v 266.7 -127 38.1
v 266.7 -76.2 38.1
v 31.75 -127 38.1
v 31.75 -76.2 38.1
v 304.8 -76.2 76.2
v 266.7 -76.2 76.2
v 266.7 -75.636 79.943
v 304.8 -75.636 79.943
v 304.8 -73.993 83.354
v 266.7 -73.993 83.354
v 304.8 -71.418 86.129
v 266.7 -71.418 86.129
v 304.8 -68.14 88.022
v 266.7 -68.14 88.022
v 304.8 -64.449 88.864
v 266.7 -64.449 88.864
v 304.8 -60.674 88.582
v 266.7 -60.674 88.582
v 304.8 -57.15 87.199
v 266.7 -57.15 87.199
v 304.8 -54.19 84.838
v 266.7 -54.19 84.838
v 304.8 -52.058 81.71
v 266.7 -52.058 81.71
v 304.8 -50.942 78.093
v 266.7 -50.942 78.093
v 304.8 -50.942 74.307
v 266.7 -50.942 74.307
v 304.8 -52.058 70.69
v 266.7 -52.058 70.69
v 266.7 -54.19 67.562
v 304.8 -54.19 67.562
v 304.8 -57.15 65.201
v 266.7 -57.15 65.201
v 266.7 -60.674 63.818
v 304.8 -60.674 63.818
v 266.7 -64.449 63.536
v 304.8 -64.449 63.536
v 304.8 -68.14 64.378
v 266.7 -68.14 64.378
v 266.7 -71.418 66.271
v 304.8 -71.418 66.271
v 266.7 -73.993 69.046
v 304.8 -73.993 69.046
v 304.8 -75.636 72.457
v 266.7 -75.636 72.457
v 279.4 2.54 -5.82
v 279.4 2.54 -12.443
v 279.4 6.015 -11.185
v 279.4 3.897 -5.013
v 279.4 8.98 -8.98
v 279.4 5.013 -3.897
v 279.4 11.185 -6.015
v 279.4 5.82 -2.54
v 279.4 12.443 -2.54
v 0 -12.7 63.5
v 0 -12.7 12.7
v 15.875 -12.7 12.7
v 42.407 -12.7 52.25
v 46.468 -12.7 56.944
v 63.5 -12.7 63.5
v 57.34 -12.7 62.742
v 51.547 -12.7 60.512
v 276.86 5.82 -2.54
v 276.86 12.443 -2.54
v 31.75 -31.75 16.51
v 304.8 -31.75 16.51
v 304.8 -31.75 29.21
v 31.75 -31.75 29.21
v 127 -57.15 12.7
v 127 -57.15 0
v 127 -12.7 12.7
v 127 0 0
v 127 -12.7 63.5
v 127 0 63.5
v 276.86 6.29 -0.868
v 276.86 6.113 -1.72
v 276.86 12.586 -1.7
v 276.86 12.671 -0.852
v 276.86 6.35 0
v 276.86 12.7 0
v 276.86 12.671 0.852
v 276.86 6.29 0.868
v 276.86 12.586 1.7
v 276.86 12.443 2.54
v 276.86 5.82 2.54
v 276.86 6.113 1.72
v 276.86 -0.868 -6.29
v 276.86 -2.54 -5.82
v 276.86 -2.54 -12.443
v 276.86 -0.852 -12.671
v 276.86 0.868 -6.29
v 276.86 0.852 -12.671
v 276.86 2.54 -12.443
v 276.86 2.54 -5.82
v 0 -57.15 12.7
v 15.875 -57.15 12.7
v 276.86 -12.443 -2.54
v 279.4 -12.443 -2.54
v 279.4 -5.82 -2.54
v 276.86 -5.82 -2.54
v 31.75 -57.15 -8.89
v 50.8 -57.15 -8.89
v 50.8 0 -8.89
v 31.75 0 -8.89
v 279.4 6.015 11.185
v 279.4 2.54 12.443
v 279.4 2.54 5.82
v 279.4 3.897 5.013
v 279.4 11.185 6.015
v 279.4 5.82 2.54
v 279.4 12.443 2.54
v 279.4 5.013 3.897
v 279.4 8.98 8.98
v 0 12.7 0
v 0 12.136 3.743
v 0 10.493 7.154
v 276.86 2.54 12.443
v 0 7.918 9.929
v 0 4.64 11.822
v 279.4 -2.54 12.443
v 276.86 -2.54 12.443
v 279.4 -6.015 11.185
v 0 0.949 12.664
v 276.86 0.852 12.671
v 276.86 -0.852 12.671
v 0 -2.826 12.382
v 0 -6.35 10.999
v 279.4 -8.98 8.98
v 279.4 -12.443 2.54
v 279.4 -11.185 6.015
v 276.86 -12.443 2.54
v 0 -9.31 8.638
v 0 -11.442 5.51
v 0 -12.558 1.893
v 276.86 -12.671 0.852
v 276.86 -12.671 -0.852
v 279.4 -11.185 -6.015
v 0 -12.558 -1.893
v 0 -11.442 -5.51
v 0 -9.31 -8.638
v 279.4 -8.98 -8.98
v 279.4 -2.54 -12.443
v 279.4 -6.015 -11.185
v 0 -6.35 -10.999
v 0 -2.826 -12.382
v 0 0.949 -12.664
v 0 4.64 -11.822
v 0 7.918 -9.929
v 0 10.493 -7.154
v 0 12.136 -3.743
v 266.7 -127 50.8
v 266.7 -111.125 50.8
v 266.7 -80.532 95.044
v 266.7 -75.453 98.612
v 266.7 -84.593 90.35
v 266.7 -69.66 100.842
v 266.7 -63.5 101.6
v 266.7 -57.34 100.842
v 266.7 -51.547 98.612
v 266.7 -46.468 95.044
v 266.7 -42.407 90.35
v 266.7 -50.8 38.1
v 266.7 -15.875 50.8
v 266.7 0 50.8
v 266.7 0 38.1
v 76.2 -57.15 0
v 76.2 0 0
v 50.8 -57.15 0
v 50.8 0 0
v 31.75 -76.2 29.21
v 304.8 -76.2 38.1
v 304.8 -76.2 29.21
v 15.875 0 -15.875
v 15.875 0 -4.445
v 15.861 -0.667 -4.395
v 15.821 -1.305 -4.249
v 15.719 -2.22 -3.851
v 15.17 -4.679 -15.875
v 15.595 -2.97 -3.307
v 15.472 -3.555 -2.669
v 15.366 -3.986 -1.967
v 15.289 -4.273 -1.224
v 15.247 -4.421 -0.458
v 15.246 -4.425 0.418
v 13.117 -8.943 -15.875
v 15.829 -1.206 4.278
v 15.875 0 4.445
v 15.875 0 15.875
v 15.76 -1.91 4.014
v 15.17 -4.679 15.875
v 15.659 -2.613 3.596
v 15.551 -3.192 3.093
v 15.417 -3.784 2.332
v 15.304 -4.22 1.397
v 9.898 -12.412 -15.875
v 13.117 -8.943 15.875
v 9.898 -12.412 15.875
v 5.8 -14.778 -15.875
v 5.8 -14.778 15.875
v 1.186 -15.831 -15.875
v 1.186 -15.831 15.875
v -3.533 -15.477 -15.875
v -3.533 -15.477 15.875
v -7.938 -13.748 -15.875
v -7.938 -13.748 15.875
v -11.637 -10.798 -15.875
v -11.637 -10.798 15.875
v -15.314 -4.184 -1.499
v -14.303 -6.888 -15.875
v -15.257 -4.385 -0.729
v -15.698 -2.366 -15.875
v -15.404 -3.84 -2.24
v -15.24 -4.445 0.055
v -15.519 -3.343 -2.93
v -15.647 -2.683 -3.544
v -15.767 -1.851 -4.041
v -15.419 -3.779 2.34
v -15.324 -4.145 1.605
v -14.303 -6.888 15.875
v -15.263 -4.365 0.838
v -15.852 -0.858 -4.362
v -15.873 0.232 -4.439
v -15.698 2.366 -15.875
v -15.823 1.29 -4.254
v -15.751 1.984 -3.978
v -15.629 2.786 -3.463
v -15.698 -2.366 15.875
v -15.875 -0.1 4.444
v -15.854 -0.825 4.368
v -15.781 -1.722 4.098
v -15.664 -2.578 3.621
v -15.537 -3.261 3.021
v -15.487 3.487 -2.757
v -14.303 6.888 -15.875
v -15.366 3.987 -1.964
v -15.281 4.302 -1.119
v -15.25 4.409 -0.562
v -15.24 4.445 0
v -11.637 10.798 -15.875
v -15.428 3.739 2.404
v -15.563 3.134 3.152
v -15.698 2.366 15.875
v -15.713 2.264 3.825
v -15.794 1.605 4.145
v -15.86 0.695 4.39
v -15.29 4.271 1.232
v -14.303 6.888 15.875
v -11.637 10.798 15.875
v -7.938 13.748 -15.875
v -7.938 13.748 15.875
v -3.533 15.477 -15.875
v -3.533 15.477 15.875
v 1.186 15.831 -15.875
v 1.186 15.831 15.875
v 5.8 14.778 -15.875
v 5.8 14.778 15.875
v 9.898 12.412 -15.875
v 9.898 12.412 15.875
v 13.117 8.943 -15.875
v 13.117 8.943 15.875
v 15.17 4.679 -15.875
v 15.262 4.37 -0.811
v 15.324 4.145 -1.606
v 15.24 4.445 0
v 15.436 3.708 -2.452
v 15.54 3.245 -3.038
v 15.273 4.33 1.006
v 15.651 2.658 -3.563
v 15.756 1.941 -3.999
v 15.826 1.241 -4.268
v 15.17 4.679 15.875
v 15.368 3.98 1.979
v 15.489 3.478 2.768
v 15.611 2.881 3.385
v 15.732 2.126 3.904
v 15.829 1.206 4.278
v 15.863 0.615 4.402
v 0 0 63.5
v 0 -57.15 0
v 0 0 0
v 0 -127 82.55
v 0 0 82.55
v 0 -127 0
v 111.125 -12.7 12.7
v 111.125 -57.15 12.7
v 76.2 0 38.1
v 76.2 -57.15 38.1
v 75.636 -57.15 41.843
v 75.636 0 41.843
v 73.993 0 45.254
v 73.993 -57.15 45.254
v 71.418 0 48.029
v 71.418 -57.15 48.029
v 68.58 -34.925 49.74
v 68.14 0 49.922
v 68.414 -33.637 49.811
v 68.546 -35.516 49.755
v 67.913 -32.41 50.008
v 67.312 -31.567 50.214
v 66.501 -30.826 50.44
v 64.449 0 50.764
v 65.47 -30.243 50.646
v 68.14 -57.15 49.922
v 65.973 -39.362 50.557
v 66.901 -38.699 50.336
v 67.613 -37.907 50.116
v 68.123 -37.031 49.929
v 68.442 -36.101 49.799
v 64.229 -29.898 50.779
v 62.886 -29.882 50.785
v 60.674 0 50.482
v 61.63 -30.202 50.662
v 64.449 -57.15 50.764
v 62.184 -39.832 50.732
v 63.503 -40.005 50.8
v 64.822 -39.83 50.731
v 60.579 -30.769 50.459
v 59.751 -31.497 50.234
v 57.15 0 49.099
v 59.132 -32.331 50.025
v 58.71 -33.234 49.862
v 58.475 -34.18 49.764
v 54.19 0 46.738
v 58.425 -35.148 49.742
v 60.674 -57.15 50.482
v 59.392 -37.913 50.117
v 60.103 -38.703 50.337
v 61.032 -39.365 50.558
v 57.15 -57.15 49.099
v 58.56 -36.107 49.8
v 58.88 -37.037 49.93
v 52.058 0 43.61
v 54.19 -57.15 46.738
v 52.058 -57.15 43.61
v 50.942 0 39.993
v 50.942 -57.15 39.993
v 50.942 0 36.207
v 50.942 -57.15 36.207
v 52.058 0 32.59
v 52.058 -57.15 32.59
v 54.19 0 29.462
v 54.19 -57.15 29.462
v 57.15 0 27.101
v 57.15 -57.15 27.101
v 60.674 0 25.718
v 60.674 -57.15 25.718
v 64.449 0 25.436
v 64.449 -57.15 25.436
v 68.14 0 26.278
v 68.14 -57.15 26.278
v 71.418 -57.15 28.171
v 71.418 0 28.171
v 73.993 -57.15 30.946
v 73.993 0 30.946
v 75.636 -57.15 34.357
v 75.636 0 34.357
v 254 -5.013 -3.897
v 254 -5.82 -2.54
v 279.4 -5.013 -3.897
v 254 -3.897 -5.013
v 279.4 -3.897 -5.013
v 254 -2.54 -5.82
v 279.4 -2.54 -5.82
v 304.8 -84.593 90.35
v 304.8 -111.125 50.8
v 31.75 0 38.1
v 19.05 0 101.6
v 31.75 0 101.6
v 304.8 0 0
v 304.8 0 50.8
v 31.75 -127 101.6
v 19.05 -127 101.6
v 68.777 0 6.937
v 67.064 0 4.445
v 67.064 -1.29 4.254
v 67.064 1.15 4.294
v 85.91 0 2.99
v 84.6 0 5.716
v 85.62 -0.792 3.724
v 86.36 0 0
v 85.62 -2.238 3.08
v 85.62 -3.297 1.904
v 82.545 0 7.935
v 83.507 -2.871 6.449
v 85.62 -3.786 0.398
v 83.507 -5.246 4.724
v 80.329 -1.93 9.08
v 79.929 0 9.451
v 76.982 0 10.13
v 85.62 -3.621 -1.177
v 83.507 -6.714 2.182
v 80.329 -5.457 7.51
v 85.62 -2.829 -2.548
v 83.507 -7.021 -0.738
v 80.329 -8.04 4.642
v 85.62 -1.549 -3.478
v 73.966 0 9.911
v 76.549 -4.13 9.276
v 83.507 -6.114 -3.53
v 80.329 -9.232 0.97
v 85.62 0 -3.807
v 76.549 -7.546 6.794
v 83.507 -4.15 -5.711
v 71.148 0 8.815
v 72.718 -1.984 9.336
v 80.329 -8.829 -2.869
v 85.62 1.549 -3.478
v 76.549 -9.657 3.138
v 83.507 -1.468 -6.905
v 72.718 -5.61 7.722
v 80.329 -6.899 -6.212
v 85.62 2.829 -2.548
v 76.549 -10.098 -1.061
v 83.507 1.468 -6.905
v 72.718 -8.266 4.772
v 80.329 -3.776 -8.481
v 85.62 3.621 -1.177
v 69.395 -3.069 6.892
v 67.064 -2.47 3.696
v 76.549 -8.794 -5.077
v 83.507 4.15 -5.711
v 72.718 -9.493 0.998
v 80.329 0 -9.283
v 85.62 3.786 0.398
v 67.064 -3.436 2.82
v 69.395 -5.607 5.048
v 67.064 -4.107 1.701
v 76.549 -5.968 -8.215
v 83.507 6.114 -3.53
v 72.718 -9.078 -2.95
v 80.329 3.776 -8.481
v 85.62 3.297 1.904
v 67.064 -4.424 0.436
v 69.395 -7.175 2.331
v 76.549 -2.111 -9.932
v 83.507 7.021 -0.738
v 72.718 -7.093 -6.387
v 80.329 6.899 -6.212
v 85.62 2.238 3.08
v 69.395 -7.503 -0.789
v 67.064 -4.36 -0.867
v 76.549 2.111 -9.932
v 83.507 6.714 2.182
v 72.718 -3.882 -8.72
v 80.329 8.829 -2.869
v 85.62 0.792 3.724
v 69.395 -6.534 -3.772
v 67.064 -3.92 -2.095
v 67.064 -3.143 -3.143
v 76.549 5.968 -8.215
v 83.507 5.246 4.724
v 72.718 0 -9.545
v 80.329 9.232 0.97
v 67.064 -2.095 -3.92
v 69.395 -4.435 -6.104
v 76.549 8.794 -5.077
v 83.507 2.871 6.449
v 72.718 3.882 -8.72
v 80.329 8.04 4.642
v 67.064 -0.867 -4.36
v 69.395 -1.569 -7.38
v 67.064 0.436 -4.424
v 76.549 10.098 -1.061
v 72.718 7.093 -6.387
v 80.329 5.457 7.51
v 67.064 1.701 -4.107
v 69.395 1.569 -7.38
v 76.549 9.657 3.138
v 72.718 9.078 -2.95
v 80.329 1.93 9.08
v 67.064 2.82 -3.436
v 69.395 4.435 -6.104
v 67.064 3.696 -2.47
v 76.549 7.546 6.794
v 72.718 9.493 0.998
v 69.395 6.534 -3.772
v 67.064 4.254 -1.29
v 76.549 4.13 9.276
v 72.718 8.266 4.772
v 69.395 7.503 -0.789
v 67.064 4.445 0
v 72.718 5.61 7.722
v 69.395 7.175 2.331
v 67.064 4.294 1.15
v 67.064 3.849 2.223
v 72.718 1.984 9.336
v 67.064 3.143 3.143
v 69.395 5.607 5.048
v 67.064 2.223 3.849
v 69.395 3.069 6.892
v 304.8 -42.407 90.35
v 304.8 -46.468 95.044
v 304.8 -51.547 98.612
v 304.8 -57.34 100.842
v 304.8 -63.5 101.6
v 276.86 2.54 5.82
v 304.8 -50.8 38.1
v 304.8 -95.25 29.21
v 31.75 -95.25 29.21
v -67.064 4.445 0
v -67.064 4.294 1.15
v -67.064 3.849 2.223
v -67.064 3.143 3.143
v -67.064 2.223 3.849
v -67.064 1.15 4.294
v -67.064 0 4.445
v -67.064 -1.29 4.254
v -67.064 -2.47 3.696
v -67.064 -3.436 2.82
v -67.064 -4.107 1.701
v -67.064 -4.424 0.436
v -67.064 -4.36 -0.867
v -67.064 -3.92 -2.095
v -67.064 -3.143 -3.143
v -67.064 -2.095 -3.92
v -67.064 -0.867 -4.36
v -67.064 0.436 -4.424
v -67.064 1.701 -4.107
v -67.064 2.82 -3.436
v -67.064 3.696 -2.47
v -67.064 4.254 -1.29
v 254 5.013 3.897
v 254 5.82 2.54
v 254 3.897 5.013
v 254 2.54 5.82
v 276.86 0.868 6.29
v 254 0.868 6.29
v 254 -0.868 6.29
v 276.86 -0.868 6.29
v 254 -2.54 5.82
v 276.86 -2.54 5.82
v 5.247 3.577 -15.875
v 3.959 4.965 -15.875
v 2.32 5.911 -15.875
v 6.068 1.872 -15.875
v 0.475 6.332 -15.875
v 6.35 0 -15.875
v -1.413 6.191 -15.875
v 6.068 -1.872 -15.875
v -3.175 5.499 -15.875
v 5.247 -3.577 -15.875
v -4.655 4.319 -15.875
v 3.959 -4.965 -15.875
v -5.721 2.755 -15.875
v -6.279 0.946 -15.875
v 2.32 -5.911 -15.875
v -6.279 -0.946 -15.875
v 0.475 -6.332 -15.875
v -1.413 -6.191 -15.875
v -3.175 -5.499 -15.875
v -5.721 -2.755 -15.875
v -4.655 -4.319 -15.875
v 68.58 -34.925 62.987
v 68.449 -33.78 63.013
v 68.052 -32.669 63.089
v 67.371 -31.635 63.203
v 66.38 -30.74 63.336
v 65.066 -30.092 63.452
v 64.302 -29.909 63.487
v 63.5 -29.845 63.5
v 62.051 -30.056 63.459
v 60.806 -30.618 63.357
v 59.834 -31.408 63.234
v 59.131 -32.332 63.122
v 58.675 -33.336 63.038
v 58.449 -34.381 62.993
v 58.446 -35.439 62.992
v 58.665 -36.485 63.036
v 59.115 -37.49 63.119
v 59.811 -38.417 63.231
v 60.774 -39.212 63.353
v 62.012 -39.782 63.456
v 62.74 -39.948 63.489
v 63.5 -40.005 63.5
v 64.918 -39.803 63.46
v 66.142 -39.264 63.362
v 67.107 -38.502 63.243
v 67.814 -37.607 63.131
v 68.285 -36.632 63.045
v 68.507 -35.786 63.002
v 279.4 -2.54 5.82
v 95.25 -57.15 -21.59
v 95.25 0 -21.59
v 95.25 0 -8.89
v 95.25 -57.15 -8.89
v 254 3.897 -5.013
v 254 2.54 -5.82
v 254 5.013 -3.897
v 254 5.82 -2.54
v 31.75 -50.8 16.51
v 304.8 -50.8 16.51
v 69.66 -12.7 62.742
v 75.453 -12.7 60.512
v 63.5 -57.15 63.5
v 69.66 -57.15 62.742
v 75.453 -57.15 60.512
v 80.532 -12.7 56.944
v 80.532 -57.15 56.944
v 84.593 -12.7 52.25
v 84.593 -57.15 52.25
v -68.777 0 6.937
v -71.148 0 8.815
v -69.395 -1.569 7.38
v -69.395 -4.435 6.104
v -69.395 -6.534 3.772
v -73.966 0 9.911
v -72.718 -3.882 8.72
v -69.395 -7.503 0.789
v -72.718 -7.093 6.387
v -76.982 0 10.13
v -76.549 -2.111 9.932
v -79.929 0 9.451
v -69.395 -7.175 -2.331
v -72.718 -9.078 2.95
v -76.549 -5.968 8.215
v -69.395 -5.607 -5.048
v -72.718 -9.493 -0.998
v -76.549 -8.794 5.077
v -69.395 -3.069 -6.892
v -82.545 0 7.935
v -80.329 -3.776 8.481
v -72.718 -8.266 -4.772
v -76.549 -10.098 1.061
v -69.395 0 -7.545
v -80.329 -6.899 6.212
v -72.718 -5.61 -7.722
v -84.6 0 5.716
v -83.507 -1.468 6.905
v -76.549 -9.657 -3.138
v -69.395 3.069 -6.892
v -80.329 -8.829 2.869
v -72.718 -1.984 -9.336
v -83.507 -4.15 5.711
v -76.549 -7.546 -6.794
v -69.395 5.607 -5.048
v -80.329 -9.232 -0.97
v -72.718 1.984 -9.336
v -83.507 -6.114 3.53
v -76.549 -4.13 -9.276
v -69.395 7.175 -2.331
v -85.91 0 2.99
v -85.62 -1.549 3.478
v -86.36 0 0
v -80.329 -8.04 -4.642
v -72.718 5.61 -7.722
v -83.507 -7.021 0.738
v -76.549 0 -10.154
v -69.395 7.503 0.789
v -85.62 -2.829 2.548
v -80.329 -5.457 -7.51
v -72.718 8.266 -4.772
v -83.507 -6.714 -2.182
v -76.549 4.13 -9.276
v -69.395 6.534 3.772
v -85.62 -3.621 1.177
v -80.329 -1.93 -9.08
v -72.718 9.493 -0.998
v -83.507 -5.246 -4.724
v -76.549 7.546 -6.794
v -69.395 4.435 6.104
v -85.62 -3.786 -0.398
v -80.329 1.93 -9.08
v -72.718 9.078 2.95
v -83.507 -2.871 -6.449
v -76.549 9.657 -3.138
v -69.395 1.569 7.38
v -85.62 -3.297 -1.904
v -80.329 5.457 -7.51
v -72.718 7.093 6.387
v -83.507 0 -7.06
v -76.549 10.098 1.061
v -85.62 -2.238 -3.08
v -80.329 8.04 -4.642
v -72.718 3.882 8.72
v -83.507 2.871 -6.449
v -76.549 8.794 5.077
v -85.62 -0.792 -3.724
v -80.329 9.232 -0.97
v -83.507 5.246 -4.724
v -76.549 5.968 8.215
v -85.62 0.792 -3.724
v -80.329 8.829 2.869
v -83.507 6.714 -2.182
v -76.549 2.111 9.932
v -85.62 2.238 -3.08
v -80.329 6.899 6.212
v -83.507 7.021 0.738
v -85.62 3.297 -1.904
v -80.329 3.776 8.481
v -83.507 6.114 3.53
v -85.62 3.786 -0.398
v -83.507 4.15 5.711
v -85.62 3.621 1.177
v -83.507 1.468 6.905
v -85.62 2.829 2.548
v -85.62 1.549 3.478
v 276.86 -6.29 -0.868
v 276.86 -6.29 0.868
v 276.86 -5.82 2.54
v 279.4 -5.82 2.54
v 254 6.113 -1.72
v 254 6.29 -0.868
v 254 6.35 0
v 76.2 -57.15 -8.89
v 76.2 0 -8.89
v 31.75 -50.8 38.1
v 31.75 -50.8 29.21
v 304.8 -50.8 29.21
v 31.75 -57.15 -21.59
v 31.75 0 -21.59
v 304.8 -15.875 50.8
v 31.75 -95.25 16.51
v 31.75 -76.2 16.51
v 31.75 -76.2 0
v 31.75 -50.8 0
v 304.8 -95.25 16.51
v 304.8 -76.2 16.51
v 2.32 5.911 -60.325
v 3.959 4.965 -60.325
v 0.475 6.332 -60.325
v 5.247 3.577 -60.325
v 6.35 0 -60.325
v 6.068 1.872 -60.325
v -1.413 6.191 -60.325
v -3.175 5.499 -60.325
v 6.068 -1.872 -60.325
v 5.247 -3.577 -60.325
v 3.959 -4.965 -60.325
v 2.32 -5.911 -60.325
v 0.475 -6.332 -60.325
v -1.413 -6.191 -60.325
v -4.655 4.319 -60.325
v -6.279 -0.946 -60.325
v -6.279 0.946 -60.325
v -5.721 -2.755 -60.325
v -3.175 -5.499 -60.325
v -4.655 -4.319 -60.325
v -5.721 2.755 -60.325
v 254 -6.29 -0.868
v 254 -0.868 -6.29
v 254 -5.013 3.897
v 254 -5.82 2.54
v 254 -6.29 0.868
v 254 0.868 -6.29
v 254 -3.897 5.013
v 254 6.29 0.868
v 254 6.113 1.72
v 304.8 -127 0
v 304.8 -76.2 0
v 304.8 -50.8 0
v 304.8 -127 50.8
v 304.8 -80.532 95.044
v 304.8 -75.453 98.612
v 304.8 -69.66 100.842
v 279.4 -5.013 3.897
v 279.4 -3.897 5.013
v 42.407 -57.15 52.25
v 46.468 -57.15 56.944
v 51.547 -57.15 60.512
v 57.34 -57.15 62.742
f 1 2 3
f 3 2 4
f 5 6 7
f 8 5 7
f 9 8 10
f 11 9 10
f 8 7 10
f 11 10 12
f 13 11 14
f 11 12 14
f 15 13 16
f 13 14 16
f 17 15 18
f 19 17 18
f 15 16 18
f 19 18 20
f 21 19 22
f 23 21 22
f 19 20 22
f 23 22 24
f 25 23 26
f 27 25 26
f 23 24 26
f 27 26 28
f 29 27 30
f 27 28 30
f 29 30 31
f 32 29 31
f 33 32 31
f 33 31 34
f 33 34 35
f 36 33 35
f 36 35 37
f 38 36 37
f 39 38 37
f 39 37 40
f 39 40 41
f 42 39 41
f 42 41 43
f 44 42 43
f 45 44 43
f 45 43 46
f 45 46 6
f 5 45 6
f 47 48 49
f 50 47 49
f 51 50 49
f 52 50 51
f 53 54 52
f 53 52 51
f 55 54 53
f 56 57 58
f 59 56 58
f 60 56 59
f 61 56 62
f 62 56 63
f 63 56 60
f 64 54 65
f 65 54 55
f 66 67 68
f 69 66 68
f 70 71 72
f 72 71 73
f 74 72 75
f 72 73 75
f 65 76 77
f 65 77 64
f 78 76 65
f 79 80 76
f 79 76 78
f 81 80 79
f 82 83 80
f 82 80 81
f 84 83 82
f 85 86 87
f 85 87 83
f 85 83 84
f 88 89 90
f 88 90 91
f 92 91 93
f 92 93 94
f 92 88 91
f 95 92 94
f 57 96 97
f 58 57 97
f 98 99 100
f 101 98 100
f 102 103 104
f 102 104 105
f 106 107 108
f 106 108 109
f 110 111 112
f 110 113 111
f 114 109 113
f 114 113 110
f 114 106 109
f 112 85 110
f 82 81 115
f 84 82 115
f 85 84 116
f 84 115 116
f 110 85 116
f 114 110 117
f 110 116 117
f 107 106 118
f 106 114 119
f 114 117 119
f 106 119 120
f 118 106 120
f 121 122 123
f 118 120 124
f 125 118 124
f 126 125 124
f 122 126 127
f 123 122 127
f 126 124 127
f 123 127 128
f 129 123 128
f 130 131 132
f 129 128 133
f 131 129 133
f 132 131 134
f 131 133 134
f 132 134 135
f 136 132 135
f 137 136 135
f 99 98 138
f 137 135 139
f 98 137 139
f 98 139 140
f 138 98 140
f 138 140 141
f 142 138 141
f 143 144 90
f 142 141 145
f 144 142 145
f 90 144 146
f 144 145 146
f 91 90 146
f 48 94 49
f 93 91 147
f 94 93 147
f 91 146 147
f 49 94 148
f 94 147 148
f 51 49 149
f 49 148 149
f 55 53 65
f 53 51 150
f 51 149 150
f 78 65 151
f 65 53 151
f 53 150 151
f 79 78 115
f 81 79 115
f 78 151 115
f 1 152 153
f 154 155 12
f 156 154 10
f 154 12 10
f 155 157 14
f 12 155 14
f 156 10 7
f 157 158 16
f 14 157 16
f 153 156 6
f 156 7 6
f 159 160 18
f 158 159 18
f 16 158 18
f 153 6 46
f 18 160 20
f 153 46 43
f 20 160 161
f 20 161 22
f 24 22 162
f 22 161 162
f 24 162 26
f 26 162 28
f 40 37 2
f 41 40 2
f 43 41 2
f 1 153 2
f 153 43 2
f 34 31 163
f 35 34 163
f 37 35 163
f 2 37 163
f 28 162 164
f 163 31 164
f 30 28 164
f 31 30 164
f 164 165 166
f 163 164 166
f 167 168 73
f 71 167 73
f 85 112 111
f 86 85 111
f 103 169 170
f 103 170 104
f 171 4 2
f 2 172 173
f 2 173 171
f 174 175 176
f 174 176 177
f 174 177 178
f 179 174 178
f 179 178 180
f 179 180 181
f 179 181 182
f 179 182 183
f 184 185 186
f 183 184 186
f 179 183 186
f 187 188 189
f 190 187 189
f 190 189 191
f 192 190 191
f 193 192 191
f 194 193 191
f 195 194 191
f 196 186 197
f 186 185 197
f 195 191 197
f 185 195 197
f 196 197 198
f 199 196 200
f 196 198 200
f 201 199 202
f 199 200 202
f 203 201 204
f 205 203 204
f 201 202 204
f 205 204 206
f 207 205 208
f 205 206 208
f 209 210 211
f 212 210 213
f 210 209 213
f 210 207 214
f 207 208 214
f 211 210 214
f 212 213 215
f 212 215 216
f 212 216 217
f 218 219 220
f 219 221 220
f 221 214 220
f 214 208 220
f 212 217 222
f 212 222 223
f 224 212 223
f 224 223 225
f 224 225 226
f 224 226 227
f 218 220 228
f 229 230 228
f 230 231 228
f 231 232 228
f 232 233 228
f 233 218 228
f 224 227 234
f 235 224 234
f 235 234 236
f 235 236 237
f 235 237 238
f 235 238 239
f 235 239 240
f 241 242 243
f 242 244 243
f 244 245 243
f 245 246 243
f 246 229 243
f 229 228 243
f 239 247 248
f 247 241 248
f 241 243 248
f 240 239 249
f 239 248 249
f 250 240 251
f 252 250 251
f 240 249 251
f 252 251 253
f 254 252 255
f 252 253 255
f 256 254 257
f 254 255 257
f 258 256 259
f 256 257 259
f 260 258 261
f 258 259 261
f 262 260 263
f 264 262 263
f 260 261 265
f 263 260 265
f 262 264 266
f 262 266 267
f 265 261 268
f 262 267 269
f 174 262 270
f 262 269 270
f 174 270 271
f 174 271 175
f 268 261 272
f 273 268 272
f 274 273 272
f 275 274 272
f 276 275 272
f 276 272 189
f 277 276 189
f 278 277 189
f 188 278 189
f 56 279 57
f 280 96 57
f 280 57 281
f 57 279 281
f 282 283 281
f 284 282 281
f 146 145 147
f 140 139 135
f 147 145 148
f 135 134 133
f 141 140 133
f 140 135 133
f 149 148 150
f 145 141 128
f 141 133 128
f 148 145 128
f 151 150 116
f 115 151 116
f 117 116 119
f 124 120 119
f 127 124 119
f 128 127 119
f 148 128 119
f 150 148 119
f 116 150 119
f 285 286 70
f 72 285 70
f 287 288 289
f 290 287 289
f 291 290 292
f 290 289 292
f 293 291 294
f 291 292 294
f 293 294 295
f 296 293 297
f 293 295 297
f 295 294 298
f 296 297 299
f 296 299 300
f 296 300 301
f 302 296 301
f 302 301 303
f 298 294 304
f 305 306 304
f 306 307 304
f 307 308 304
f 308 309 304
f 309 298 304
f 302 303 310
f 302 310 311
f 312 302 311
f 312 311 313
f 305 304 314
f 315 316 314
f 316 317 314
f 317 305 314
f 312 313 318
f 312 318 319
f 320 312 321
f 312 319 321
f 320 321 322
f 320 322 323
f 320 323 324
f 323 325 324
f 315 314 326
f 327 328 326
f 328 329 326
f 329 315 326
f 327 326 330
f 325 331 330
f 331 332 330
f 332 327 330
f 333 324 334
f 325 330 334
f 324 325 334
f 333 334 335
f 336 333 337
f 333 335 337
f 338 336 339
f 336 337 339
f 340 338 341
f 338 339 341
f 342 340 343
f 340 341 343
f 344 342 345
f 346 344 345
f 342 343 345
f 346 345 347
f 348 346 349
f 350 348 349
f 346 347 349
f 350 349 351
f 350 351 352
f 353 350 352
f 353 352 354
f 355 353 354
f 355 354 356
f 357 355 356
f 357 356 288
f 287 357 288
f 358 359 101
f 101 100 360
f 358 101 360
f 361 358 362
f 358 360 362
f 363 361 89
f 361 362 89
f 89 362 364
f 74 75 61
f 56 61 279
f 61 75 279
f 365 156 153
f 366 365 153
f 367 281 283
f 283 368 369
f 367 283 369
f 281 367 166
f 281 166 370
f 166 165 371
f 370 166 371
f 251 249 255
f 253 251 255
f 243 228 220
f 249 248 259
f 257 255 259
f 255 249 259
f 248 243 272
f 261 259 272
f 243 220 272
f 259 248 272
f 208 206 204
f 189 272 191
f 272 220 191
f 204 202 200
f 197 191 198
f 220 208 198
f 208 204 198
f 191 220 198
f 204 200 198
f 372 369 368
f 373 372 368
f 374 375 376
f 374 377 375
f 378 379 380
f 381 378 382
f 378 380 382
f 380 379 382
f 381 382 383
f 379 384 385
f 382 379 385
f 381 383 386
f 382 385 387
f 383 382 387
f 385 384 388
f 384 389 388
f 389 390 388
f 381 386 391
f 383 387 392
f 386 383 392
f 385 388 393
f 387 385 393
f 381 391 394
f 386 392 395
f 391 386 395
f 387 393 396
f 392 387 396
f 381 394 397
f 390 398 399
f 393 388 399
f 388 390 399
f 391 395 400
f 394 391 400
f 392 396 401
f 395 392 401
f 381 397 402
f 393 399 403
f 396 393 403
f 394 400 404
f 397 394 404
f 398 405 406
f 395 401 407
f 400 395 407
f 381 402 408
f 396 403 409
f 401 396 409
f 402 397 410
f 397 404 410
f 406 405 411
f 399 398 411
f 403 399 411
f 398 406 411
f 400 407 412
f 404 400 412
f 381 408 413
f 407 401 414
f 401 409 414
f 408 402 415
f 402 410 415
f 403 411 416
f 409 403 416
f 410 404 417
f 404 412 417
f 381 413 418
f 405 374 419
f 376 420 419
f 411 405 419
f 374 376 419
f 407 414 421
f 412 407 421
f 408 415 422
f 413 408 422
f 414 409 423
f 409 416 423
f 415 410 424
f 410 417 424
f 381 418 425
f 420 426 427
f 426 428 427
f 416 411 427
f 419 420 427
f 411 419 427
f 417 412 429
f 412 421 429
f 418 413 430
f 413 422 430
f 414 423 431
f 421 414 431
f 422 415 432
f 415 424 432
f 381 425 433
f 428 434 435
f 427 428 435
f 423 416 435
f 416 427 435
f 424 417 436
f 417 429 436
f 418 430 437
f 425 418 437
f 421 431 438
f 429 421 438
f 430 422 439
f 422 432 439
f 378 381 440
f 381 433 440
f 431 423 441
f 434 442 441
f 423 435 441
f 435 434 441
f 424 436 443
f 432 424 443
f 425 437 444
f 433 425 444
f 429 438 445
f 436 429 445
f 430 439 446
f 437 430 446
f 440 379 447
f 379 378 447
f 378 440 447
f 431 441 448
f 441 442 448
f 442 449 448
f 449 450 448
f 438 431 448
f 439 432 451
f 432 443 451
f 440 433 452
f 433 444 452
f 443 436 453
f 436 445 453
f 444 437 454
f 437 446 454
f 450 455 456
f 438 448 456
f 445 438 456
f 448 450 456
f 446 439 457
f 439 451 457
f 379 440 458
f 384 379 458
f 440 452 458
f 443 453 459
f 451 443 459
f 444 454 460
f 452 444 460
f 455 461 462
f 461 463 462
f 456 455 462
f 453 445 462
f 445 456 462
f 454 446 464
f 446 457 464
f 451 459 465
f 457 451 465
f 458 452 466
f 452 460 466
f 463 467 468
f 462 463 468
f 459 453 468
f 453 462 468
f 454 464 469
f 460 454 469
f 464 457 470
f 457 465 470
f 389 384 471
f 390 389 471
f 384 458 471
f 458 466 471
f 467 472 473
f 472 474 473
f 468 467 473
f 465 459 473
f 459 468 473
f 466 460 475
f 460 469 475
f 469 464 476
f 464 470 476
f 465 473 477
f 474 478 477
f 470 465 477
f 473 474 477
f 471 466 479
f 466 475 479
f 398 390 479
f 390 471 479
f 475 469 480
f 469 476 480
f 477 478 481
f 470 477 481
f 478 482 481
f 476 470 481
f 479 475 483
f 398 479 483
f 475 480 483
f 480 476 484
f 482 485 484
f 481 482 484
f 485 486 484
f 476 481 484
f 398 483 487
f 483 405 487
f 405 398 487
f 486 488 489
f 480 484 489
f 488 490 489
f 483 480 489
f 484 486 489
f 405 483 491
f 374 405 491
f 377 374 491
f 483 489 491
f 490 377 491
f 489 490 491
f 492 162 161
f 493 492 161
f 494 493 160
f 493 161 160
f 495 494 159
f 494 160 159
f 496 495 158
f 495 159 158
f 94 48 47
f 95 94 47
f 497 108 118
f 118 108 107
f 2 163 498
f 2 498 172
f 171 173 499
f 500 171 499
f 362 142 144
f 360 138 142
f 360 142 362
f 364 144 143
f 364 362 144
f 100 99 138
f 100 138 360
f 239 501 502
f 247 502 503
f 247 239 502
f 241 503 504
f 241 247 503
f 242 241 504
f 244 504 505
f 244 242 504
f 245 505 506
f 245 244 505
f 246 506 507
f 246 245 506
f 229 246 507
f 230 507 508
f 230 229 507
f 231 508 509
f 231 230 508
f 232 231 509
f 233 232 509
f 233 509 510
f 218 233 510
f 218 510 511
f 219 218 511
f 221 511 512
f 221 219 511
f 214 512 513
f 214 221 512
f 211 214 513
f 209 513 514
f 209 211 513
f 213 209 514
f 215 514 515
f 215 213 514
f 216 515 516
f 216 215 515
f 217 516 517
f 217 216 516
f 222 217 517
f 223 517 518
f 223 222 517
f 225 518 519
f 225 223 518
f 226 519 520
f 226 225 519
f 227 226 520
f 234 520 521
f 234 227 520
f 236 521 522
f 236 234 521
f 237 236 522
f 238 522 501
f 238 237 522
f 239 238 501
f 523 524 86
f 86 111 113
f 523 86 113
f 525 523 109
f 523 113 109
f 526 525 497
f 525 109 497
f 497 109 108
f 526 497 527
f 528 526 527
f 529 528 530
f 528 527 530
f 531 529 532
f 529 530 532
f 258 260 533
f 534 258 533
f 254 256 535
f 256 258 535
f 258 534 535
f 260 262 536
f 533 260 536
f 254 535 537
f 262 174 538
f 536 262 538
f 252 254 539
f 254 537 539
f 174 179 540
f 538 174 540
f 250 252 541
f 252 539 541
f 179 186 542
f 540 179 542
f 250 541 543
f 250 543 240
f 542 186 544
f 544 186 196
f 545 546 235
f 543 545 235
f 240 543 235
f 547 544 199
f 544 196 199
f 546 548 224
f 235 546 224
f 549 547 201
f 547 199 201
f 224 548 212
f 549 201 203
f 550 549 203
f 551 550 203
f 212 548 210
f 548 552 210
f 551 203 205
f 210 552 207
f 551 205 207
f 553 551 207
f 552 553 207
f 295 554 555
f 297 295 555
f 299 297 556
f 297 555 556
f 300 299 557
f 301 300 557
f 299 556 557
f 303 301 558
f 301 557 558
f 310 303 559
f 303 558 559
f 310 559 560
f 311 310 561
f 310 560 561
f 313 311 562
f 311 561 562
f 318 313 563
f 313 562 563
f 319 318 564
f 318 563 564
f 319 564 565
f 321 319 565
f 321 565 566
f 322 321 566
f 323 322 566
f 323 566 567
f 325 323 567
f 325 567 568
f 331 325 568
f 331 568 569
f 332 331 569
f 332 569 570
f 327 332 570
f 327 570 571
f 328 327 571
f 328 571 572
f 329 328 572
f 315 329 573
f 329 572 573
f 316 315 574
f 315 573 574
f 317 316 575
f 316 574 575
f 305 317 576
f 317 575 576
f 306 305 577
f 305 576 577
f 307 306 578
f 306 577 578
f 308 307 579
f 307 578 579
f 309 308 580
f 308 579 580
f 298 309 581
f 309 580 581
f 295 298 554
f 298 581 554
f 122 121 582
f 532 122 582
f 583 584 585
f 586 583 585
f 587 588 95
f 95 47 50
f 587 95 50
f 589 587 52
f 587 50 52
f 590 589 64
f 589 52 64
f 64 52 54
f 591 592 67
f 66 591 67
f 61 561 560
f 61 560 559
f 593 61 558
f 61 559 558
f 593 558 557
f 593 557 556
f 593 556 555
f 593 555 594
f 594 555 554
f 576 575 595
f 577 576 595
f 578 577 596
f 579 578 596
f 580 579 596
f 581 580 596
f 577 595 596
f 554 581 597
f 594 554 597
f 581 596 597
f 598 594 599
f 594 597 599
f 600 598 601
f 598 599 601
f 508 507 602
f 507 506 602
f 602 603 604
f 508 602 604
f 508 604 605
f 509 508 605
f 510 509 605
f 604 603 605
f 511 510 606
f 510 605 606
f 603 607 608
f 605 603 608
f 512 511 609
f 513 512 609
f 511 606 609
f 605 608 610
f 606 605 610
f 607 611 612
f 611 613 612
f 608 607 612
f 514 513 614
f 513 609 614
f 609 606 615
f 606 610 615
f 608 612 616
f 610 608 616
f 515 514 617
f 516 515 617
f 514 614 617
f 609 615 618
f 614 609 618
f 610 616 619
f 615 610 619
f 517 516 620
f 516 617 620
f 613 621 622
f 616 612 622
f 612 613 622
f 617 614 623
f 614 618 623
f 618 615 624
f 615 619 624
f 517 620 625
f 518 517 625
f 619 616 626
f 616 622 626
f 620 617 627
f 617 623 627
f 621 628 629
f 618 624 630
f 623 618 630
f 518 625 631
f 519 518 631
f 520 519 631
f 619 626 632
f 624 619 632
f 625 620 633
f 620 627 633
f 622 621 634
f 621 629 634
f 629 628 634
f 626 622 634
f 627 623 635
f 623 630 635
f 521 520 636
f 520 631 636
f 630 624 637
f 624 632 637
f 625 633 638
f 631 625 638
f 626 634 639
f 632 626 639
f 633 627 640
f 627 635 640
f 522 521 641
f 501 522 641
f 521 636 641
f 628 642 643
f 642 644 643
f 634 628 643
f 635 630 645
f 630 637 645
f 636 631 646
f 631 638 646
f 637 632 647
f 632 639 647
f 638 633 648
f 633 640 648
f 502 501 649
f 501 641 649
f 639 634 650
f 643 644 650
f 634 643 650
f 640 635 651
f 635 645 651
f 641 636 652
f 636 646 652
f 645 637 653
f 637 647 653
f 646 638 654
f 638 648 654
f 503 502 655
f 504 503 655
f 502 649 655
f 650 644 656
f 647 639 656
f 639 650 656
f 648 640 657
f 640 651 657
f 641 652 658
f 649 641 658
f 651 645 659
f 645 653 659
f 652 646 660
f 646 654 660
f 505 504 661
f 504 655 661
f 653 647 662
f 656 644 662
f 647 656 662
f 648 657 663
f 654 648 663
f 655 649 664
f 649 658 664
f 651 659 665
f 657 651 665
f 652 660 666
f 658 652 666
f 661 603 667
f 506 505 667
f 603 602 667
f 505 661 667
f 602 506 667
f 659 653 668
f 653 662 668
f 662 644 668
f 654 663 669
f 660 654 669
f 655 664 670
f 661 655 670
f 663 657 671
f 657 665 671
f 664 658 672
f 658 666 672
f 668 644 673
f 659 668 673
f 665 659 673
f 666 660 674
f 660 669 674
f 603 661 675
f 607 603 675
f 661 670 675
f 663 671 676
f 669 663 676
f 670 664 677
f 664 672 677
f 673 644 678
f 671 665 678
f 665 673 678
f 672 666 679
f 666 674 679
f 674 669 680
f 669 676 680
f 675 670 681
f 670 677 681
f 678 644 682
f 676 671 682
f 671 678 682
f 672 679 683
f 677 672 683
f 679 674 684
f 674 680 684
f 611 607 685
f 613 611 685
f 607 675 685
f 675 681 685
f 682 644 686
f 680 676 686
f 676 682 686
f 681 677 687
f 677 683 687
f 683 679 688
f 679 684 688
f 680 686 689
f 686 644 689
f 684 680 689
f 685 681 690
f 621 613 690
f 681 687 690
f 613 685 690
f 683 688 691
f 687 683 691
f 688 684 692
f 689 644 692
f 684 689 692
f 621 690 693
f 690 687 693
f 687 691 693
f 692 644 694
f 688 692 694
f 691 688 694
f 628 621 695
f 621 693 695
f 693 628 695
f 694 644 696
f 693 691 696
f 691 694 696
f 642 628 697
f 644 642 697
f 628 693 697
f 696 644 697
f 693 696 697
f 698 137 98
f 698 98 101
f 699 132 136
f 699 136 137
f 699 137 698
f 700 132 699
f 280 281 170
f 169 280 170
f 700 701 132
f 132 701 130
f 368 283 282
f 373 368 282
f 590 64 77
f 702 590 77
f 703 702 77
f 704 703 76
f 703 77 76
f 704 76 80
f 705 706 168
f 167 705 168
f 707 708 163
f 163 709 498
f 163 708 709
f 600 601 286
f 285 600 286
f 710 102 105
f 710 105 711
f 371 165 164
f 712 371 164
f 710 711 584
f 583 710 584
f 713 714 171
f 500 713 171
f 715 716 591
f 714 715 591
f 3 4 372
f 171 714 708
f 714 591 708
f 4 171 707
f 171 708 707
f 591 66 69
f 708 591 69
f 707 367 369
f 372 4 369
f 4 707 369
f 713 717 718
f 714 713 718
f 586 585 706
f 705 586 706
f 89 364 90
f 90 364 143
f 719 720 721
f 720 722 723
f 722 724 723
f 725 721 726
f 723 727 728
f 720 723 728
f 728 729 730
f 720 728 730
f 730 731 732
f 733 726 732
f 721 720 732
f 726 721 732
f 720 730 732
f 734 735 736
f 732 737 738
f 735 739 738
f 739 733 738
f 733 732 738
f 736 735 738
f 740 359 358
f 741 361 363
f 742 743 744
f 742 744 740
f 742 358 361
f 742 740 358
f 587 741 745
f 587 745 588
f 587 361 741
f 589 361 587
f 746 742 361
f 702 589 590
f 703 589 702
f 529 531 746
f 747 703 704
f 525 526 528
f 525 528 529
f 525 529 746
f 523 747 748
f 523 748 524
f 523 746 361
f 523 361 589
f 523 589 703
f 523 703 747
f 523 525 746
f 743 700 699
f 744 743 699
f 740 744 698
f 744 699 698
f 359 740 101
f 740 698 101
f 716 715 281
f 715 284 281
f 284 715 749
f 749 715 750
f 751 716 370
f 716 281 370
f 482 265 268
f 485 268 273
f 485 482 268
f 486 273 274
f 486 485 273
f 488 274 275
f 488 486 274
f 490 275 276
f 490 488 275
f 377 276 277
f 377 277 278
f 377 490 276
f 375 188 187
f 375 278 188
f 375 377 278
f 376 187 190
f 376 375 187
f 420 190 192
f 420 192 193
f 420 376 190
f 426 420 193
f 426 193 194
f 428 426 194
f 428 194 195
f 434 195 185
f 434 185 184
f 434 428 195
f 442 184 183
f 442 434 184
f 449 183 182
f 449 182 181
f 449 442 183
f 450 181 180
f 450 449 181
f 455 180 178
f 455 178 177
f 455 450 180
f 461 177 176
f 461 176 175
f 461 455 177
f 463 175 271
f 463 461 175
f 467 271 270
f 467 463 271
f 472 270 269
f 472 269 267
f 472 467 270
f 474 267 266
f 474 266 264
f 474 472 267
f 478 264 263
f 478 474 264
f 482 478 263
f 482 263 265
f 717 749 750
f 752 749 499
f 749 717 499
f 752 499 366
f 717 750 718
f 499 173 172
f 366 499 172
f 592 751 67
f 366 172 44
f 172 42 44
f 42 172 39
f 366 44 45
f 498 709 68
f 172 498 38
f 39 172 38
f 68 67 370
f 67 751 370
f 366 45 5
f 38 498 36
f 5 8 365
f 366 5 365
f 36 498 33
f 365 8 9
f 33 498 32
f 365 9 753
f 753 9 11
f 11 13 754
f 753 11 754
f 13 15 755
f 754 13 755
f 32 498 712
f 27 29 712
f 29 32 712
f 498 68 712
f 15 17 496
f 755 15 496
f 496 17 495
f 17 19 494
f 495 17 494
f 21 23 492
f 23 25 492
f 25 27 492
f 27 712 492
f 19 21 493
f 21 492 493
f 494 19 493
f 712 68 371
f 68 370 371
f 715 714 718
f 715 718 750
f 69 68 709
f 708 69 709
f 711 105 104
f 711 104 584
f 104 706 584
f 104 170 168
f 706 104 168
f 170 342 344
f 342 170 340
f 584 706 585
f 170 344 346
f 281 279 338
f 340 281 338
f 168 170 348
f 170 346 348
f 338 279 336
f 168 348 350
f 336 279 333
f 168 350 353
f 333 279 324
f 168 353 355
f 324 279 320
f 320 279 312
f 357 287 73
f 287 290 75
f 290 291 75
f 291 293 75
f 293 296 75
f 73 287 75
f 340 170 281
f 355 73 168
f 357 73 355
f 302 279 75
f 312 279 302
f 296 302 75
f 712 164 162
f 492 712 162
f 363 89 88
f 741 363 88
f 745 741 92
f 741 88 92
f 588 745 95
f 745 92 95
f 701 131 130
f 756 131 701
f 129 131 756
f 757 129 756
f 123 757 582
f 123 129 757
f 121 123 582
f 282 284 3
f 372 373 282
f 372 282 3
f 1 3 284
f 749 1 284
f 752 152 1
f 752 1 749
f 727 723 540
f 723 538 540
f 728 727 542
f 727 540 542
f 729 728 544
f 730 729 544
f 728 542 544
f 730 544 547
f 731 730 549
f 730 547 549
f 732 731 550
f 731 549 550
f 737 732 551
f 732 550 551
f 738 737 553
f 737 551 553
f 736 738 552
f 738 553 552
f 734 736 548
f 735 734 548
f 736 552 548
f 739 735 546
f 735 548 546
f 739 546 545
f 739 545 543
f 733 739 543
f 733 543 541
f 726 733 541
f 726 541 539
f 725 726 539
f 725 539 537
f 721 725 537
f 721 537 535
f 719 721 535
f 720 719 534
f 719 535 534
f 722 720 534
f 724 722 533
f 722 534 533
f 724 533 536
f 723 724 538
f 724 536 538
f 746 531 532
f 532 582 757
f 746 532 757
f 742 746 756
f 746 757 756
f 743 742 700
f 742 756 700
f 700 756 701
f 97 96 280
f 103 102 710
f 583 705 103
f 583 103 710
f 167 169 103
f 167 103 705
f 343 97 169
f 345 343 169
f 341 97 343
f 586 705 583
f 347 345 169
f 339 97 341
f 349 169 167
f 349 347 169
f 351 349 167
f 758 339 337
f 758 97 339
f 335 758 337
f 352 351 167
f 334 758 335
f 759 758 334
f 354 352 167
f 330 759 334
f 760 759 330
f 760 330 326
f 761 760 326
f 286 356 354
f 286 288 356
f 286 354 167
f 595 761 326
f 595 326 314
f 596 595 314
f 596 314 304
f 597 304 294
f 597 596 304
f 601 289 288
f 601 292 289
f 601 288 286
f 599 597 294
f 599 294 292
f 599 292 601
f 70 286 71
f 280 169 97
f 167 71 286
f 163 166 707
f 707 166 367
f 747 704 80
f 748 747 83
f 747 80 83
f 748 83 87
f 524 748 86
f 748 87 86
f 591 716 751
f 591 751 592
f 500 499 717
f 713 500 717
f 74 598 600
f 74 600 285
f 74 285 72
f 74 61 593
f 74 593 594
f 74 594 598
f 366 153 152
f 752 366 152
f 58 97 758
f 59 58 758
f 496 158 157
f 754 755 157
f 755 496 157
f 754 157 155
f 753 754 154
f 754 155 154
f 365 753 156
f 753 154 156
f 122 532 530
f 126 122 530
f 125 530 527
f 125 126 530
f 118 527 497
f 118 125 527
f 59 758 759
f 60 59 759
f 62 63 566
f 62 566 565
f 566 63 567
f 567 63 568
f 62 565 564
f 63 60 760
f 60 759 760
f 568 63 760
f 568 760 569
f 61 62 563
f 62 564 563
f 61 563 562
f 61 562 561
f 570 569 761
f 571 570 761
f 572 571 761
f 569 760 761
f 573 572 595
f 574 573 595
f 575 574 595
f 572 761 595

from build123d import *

# Parameters (mm, degrees)
F1_DEPTH  = 127
F2_SIZE2  = 19.05
F2_SIZE   = 19.05
F4_DEPTH  = 273.05
F5_R      = 12.7
F6_DEPTH  = 38.101
F8_DEPTH  = 57.15
F10_DEPTH = 44.45
F9_R      = 12.7
F11_DEPTH = 57.151
F12_R     = 5.08
F13_REACH = 99.4594097937
F14_R     = 12.7
F15_DEPTH = 279.4
F17_DEPTH = 25.4
F18_DEPTH = 2.54
F19_R     = 4.445
F20_DEPTH = 76.2


with BuildPart() as f1:
    # F0 (on Front) → F1 (new body)
    with BuildSketch(Plane.XZ):
        Polygon((31.75, 38.1), (31.75, 101.6), (0, 101.6), (0, 0), (304.8, 0), (304.8, 101.6), (266.7, 101.6), (266.7, 38.1), align=None)
    extrude(amount=F1_DEPTH)

    # F2
    f2_edges = [f1.edges().sort_by_distance(p)[0] for p in [
        (0, -63.5, 101.6),
    ]]
    chamfer(f2_edges, length=F2_SIZE, length2=F2_SIZE2)

    # F3 (on face) → F4 (cut, through all)
    with BuildSketch(Plane.YZ.offset(304.8)):
        Polygon((-76.2, 16.51), (-76.2, 0), (-50.8, 0), (-50.8, 16.51), (-31.75, 16.51), (-31.75, 29.21), (-50.8, 29.21), (-50.8, 38.1), (-76.2, 38.1), (-76.2, 29.21), (-95.25, 29.21), (-95.25, 16.51), align=None)
    extrude(amount=-F4_DEPTH, mode=Mode.SUBTRACT)

    # F5 (on face) → F6 (cut, through all)
    with BuildSketch(Plane(origin=(266.7, 0, 0), x_dir=(0, -1, 0), z_dir=(-1, 0, 0))):
        with BuildLine():
            Line((0, 101.6), (0, 50.8))
            Line((0, 50.8), (15.875, 50.8))
            Line((15.875, 50.8), (42.4065743945, 90.3501730104))
            ThreePointArc((42.4065743945, 90.3501730104), (51.5470588235, 98.6117647059), (63.5, 101.6))
            Line((63.5, 101.6), (0, 101.6))
        make_face()
        with BuildLine():
            Line((84.5934256055, 90.3501730104), (111.125, 50.8))
            Line((111.125, 50.8), (127, 50.8))
            Line((127, 50.8), (127, 101.6))
            Line((127, 101.6), (63.5, 101.6))
            ThreePointArc((63.5, 101.6), (75.4529411765, 98.6117647059), (84.5934256055, 90.3501730104))
        make_face()
        with Locations((63.5, 76.2)):
            Circle(F5_R)
    extrude(amount=-F6_DEPTH, mode=Mode.SUBTRACT)


with BuildPart() as f8:
    # F7 (on Front) → F8 (new body)
    with BuildSketch(Plane.XZ):
        Polygon((0, 63.5), (0, 0), (50.8, 0), (50.8, -8.89), (31.75, -8.89), (31.75, -21.59), (95.25, -21.59), (95.25, -8.89), (76.2, -8.89), (76.2, 0), (127, 0), (127, 63.5), align=None)
    extrude(amount=F8_DEPTH)

    # F9 (on face) → F10 (cut)
    with BuildSketch(Plane.XZ.offset(57.15)):
        with BuildLine():
            Line((0, 63.5), (0, 12.7))
            Line((0, 12.7), (15.875, 12.7))
            Line((15.875, 12.7), (42.4065743945, 52.2501730104))
            ThreePointArc((42.4065743945, 52.2501730104), (51.5470588235, 60.5117647059), (63.5, 63.5))
            Line((63.5, 63.5), (0, 63.5))
        make_face()
        with BuildLine():
            Line((127, 63.5), (63.5, 63.5))
            ThreePointArc((63.5, 63.5), (75.4529411765, 60.5117647059), (84.5934256055, 52.2501730104))
            Line((84.5934256055, 52.2501730104), (111.125, 12.7))
            Line((111.125, 12.7), (127, 12.7))
            Line((127, 12.7), (127, 63.5))
        make_face()
    extrude(amount=-F10_DEPTH, mode=Mode.SUBTRACT)

    # F9 (on face) → F11 (cut, through all)
    with BuildSketch(Plane.XZ.offset(57.15)):
        with Locations((63.5, 38.1)):
            Circle(F9_R)
    extrude(amount=-F11_DEPTH, mode=Mode.SUBTRACT)

    f13_end = f8.faces().sort_by_distance((50.8, -28.575, 38.1))[0]
    # F12 (on face) → F13 (cut, up to a face of the model that its end follows)
    with BuildSketch(Plane.XY.offset(63.5)):
        with Locations((63.5, -34.925)):
            Circle(F12_R)
    f13_long = extrude(amount=-F13_REACH, mode=Mode.PRIVATE)
    add(split(f13_long, bisect_by=f13_end, keep=Keep.ALL, mode=Mode.PRIVATE).solids().sort_by_distance((63.5, -34.925, 63.5))[0], mode=Mode.SUBTRACT)


with BuildPart() as f15:
    # F14 (on Right) → F15 (new body)
    with BuildSketch(Plane.YZ):
        Circle(F14_R)
    extrude(amount=F15_DEPTH)

    # F16 (on face) → F17 (cut)
    with BuildSketch(Plane.YZ.offset(279.4)):
        with BuildLine():
            ThreePointArc((5.8198711326, -2.54), (6.2160550871, -1.2973662374), (6.35, 0))
            ThreePointArc((6.35, 0), (6.2160550871, 1.2973662374), (5.8198711326, 2.54))
            ThreePointArc((5.8198711326, 2.54), (4.4901280605, 4.4901280605), (2.54, 5.8198711326))
            ThreePointArc((2.54, 5.8198711326), (0, 6.35), (-2.54, 5.8198711326))
            ThreePointArc((-2.54, 5.8198711326), (-4.4901280605, 4.4901280605), (-5.8198711326, 2.54))
            ThreePointArc((-5.8198711326, 2.54), (-6.35, 0), (-5.8198711326, -2.54))
            ThreePointArc((-5.8198711326, -2.54), (-4.4901280605, -4.4901280605), (-2.54, -5.8198711326))
            ThreePointArc((-2.54, -5.8198711326), (0, -6.35), (2.54, -5.8198711326))
            ThreePointArc((2.54, -5.8198711326), (4.4901280605, -4.4901280605), (5.8198711326, -2.54))
        make_face()
    extrude(amount=-F17_DEPTH, mode=Mode.SUBTRACT)

    # F16 (on face) → F18 (cut)
    with BuildSketch(Plane.YZ.offset(279.4)):
        with BuildLine():
            ThreePointArc((-5.8198711326, -2.54), (-6.35, 0), (-5.8198711326, 2.54))
            Line((-5.8198711326, 2.54), (-12.4434078933, 2.54))
            ThreePointArc((-12.4434078933, 2.54), (-12.7, 0), (-12.4434078933, -2.54))
            Line((-12.4434078933, -2.54), (-5.8198711326, -2.54))
        make_face()
        with BuildLine():
            ThreePointArc((-2.54, 5.8198711326), (0, 6.35), (2.54, 5.8198711326))
            Line((2.54, 5.8198711326), (2.54, 12.4434078933))
            ThreePointArc((2.54, 12.4434078933), (0, 12.7), (-2.54, 12.4434078933))
            Line((-2.54, 12.4434078933), (-2.54, 5.8198711326))
        make_face()
        with BuildLine():
            ThreePointArc((5.8198711326, 2.54), (6.2160550871, 1.2973662374), (6.35, 0))
            ThreePointArc((6.35, 0), (6.2160550871, -1.2973662374), (5.8198711326, -2.54))
            Line((5.8198711326, -2.54), (12.4434078933, -2.54))
            ThreePointArc((12.4434078933, -2.54), (12.6356891432, -1.2764638175), (12.7, 0))
            ThreePointArc((12.7, 0), (12.6356891432, 1.2764638175), (12.4434078933, 2.54))
            Line((12.4434078933, 2.54), (5.8198711326, 2.54))
        make_face()
        with BuildLine():
            Line((2.54, -12.4434078933), (2.54, -5.8198711326))
            ThreePointArc((2.54, -5.8198711326), (0, -6.35), (-2.54, -5.8198711326))
            Line((-2.54, -5.8198711326), (-2.54, -12.4434078933))
            ThreePointArc((-2.54, -12.4434078933), (0, -12.7), (2.54, -12.4434078933))
        make_face()
    extrude(amount=-F18_DEPTH, mode=Mode.SUBTRACT)


with BuildPart() as f20:
    # F19 (on Right) → F20 (new body, symmetric)
    with BuildSketch(Plane.YZ):
        Circle(F19_R)
    extrude(amount=F20_DEPTH, both=True)

    # F21 (on Front) → F22 (revolve)
    with BuildSketch(Plane.XZ):
        Polygon((0, 15.875), (0, -60.325), (6.35, -60.325), (6.35, -15.875), (15.875, -15.875), (15.875, 15.875), align=None)
    revolve(axis=Axis((0, 0, -22.225), (0, 0, -1)))

    # F23 (on Front) → F24 (revolve)
    with BuildSketch(Plane.XZ):
        with BuildLine():
            Line((-86.36, 0), (-66.04, 0))
            ThreePointArc((-66.04, 0), (-76.2, 10.16), (-86.36, 0))
        make_face()
        with BuildLine():
            Line((66.04, 0), (86.36, 0))
            ThreePointArc((86.36, 0), (76.2, 10.16), (66.04, 0))
        make_face()
    revolve(axis=Axis((-76.2, 0, 0), (1, 0, 0)))


solid = Compound([f1.part, f8.part, f15.part, f20.part])
